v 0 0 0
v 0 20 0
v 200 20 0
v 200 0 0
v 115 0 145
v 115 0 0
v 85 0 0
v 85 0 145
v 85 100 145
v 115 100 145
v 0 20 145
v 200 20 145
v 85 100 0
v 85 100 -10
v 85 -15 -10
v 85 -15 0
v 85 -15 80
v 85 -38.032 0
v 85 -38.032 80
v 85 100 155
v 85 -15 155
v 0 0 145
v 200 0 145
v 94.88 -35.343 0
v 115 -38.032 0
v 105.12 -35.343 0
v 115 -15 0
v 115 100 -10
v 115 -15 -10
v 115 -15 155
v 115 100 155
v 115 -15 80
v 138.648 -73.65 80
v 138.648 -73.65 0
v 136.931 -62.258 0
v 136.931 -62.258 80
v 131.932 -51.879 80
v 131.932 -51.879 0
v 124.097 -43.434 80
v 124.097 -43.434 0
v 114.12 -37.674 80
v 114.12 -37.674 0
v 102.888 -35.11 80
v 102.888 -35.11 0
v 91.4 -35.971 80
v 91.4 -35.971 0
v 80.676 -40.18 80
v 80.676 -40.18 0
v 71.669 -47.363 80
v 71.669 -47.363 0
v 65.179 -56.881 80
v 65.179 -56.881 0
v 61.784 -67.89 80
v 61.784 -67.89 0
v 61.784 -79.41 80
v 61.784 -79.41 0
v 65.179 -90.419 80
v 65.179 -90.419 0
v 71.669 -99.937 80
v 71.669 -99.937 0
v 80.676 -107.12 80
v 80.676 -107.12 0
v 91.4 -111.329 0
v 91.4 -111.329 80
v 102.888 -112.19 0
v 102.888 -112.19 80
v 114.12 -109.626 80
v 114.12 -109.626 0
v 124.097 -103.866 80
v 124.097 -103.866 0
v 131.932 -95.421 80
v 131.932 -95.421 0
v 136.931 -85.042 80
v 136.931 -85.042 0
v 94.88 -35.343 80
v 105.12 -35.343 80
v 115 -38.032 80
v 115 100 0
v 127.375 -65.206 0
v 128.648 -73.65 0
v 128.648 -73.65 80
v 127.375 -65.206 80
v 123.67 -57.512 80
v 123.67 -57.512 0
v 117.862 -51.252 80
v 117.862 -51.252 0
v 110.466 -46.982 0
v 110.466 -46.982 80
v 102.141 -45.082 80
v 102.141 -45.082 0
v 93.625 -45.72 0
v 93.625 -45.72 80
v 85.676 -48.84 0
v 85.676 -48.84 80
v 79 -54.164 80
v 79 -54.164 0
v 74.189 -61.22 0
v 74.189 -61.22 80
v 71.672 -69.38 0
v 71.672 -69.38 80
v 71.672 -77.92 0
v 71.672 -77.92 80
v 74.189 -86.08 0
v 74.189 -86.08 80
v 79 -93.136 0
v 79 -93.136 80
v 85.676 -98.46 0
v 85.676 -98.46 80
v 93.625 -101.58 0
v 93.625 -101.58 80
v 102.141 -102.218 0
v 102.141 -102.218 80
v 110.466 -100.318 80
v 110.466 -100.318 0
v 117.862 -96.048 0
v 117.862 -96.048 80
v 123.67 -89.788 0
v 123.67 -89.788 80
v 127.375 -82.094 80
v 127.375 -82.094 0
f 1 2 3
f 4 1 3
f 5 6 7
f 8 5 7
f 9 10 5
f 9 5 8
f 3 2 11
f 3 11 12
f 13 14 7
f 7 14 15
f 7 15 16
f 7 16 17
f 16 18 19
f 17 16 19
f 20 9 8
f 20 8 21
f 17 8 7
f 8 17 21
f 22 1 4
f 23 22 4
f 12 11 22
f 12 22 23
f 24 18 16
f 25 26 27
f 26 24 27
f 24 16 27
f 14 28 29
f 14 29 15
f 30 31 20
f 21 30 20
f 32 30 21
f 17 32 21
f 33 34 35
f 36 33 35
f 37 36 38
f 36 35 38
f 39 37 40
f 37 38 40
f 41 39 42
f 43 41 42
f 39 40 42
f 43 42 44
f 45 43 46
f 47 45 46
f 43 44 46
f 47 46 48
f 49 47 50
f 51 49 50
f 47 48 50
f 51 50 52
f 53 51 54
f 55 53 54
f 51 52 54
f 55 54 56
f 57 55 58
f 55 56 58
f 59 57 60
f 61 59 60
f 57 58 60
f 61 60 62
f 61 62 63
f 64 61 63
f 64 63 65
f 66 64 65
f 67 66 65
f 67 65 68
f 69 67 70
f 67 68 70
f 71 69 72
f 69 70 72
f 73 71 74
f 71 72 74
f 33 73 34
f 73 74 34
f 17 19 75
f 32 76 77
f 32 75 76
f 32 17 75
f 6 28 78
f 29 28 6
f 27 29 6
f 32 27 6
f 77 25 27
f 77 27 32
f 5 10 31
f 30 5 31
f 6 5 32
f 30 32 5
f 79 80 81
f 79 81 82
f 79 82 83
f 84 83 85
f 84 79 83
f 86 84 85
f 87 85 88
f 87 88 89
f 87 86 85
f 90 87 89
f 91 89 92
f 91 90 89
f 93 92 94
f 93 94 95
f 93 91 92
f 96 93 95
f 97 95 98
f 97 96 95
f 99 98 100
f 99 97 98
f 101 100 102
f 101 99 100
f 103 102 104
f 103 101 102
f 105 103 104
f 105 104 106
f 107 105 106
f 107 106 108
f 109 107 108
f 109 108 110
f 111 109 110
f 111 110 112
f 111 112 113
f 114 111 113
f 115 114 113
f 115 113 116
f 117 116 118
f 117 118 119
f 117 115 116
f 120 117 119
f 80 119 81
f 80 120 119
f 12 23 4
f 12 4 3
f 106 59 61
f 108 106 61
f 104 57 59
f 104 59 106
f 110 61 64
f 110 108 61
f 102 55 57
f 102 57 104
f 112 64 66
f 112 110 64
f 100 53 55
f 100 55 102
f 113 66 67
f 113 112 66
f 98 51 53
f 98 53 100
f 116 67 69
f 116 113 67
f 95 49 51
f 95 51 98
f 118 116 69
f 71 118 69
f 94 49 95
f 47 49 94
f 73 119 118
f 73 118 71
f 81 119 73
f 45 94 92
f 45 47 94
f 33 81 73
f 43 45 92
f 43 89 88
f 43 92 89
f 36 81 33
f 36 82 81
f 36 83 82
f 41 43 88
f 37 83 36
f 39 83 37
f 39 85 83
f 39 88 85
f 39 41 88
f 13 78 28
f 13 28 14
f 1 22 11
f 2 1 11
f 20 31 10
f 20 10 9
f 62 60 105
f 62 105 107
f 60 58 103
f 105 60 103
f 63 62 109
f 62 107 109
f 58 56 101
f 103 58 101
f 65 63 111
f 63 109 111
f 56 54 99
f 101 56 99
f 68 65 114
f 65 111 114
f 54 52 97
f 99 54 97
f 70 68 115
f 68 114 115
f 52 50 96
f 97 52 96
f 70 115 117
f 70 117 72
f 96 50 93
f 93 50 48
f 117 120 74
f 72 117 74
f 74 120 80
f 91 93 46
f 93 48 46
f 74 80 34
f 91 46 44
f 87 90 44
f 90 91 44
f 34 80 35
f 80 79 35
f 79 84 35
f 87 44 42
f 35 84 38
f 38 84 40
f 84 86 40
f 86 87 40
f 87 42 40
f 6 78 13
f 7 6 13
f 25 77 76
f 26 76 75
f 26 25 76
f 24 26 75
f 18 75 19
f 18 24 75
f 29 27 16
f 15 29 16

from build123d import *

# Parameters (mm, degrees)
BOX_W            = 200
BOX_H            = 20
BOX_DEPTH        = 145
TUBE_R           = 38.64789
TUBE_R_2         = 28.64789
TUBE_DEPTH       = 80
TUBE001_R        = 38.64789
TUBE001_R_2      = 28.64789
TUBE001_DEPTH    = 80
SKETCH001_W      = 30
SKETCH001_H      = 10
EXTRUDE001_DEPTH = 100
SKETCH002_W      = 30
SKETCH002_H      = 10
EXTRUDE002_DEPTH = 100
SKETCH003_W      = 30
SKETCH003_H      = 80
EXTRUDE003_DEPTH = 25
EXTRUDE_DEPTH    = 15


with BuildPart() as cube:
    # Box → Box (new body)
    with BuildSketch(Plane.XY):
        with Locations((100, 10)):
            Rectangle(BOX_W, BOX_H)
    extrude(amount=BOX_DEPTH)


with BuildPart() as tube:
    # Tube → Tube (new body)
    with BuildSketch(Plane(origin=(100, -73.65, 0), x_dir=(1, 0, 0), z_dir=(0, 0, 1))):
        Circle(TUBE_R)
        Circle(TUBE_R_2, mode=Mode.SUBTRACT)
    extrude(amount=TUBE_DEPTH)


with BuildPart() as tube001:
    # Tube001 → Tube001 (new body)
    with BuildSketch(Plane(origin=(100, -73.65, 0), x_dir=(1, 0, 0), z_dir=(0, 0, 1))):
        Circle(TUBE001_R)
        Circle(TUBE001_R_2, mode=Mode.SUBTRACT)
    extrude(amount=TUBE001_DEPTH)


with BuildPart() as extrude001:
    # Sketch001 (on Face9 of Extrude) → Extrude001 (new body)
    with BuildSketch(Plane(origin=(0, 0, 0), x_dir=(-1, 0, 0), z_dir=(0, 1, 0))):
        with Locations((-100, 150)):
            Rectangle(SKETCH001_W, SKETCH001_H)
    extrude(amount=EXTRUDE001_DEPTH)


with BuildPart() as extrude002:
    # Sketch002 (on Face9 of Extrude) → Extrude002 (new body)
    with BuildSketch(Plane(origin=(0, 0, 0), x_dir=(-1, 0, 0), z_dir=(0, 1, 0))):
        with Locations((-100, -5)):
            Rectangle(SKETCH002_W, SKETCH002_H)
    extrude(amount=EXTRUDE002_DEPTH)


with BuildPart() as extrude003:
    # Sketch003 (on Face10 of Extrude) → Extrude003 (new body)
    with BuildSketch(Plane.XZ.offset(15)):
        with Locations((100, 40)):
            Rectangle(SKETCH003_W, SKETCH003_H)
    extrude(amount=EXTRUDE003_DEPTH)


with BuildPart() as hanger:
    # Sketch (on Face3 of Box) → Extrude (new body)
    with BuildSketch(Plane.XZ):
        Polygon((85, 0), (85, 145), (85, 155), (115, 155), (115, 145), (115, 0), (115, -10), (85, -10), align=None)
    extrude(amount=EXTRUDE_DEPTH)

    # Fusion: union Extrude001, Extrude002, Extrude003
    add(extrude001.part)
    add(extrude002.part)
    add(extrude003.part)

    # Cut: cut Tube001
    add(tube001.part, mode=Mode.SUBTRACT)


solid = Compound([cube.part, tube.part, hanger.part])
